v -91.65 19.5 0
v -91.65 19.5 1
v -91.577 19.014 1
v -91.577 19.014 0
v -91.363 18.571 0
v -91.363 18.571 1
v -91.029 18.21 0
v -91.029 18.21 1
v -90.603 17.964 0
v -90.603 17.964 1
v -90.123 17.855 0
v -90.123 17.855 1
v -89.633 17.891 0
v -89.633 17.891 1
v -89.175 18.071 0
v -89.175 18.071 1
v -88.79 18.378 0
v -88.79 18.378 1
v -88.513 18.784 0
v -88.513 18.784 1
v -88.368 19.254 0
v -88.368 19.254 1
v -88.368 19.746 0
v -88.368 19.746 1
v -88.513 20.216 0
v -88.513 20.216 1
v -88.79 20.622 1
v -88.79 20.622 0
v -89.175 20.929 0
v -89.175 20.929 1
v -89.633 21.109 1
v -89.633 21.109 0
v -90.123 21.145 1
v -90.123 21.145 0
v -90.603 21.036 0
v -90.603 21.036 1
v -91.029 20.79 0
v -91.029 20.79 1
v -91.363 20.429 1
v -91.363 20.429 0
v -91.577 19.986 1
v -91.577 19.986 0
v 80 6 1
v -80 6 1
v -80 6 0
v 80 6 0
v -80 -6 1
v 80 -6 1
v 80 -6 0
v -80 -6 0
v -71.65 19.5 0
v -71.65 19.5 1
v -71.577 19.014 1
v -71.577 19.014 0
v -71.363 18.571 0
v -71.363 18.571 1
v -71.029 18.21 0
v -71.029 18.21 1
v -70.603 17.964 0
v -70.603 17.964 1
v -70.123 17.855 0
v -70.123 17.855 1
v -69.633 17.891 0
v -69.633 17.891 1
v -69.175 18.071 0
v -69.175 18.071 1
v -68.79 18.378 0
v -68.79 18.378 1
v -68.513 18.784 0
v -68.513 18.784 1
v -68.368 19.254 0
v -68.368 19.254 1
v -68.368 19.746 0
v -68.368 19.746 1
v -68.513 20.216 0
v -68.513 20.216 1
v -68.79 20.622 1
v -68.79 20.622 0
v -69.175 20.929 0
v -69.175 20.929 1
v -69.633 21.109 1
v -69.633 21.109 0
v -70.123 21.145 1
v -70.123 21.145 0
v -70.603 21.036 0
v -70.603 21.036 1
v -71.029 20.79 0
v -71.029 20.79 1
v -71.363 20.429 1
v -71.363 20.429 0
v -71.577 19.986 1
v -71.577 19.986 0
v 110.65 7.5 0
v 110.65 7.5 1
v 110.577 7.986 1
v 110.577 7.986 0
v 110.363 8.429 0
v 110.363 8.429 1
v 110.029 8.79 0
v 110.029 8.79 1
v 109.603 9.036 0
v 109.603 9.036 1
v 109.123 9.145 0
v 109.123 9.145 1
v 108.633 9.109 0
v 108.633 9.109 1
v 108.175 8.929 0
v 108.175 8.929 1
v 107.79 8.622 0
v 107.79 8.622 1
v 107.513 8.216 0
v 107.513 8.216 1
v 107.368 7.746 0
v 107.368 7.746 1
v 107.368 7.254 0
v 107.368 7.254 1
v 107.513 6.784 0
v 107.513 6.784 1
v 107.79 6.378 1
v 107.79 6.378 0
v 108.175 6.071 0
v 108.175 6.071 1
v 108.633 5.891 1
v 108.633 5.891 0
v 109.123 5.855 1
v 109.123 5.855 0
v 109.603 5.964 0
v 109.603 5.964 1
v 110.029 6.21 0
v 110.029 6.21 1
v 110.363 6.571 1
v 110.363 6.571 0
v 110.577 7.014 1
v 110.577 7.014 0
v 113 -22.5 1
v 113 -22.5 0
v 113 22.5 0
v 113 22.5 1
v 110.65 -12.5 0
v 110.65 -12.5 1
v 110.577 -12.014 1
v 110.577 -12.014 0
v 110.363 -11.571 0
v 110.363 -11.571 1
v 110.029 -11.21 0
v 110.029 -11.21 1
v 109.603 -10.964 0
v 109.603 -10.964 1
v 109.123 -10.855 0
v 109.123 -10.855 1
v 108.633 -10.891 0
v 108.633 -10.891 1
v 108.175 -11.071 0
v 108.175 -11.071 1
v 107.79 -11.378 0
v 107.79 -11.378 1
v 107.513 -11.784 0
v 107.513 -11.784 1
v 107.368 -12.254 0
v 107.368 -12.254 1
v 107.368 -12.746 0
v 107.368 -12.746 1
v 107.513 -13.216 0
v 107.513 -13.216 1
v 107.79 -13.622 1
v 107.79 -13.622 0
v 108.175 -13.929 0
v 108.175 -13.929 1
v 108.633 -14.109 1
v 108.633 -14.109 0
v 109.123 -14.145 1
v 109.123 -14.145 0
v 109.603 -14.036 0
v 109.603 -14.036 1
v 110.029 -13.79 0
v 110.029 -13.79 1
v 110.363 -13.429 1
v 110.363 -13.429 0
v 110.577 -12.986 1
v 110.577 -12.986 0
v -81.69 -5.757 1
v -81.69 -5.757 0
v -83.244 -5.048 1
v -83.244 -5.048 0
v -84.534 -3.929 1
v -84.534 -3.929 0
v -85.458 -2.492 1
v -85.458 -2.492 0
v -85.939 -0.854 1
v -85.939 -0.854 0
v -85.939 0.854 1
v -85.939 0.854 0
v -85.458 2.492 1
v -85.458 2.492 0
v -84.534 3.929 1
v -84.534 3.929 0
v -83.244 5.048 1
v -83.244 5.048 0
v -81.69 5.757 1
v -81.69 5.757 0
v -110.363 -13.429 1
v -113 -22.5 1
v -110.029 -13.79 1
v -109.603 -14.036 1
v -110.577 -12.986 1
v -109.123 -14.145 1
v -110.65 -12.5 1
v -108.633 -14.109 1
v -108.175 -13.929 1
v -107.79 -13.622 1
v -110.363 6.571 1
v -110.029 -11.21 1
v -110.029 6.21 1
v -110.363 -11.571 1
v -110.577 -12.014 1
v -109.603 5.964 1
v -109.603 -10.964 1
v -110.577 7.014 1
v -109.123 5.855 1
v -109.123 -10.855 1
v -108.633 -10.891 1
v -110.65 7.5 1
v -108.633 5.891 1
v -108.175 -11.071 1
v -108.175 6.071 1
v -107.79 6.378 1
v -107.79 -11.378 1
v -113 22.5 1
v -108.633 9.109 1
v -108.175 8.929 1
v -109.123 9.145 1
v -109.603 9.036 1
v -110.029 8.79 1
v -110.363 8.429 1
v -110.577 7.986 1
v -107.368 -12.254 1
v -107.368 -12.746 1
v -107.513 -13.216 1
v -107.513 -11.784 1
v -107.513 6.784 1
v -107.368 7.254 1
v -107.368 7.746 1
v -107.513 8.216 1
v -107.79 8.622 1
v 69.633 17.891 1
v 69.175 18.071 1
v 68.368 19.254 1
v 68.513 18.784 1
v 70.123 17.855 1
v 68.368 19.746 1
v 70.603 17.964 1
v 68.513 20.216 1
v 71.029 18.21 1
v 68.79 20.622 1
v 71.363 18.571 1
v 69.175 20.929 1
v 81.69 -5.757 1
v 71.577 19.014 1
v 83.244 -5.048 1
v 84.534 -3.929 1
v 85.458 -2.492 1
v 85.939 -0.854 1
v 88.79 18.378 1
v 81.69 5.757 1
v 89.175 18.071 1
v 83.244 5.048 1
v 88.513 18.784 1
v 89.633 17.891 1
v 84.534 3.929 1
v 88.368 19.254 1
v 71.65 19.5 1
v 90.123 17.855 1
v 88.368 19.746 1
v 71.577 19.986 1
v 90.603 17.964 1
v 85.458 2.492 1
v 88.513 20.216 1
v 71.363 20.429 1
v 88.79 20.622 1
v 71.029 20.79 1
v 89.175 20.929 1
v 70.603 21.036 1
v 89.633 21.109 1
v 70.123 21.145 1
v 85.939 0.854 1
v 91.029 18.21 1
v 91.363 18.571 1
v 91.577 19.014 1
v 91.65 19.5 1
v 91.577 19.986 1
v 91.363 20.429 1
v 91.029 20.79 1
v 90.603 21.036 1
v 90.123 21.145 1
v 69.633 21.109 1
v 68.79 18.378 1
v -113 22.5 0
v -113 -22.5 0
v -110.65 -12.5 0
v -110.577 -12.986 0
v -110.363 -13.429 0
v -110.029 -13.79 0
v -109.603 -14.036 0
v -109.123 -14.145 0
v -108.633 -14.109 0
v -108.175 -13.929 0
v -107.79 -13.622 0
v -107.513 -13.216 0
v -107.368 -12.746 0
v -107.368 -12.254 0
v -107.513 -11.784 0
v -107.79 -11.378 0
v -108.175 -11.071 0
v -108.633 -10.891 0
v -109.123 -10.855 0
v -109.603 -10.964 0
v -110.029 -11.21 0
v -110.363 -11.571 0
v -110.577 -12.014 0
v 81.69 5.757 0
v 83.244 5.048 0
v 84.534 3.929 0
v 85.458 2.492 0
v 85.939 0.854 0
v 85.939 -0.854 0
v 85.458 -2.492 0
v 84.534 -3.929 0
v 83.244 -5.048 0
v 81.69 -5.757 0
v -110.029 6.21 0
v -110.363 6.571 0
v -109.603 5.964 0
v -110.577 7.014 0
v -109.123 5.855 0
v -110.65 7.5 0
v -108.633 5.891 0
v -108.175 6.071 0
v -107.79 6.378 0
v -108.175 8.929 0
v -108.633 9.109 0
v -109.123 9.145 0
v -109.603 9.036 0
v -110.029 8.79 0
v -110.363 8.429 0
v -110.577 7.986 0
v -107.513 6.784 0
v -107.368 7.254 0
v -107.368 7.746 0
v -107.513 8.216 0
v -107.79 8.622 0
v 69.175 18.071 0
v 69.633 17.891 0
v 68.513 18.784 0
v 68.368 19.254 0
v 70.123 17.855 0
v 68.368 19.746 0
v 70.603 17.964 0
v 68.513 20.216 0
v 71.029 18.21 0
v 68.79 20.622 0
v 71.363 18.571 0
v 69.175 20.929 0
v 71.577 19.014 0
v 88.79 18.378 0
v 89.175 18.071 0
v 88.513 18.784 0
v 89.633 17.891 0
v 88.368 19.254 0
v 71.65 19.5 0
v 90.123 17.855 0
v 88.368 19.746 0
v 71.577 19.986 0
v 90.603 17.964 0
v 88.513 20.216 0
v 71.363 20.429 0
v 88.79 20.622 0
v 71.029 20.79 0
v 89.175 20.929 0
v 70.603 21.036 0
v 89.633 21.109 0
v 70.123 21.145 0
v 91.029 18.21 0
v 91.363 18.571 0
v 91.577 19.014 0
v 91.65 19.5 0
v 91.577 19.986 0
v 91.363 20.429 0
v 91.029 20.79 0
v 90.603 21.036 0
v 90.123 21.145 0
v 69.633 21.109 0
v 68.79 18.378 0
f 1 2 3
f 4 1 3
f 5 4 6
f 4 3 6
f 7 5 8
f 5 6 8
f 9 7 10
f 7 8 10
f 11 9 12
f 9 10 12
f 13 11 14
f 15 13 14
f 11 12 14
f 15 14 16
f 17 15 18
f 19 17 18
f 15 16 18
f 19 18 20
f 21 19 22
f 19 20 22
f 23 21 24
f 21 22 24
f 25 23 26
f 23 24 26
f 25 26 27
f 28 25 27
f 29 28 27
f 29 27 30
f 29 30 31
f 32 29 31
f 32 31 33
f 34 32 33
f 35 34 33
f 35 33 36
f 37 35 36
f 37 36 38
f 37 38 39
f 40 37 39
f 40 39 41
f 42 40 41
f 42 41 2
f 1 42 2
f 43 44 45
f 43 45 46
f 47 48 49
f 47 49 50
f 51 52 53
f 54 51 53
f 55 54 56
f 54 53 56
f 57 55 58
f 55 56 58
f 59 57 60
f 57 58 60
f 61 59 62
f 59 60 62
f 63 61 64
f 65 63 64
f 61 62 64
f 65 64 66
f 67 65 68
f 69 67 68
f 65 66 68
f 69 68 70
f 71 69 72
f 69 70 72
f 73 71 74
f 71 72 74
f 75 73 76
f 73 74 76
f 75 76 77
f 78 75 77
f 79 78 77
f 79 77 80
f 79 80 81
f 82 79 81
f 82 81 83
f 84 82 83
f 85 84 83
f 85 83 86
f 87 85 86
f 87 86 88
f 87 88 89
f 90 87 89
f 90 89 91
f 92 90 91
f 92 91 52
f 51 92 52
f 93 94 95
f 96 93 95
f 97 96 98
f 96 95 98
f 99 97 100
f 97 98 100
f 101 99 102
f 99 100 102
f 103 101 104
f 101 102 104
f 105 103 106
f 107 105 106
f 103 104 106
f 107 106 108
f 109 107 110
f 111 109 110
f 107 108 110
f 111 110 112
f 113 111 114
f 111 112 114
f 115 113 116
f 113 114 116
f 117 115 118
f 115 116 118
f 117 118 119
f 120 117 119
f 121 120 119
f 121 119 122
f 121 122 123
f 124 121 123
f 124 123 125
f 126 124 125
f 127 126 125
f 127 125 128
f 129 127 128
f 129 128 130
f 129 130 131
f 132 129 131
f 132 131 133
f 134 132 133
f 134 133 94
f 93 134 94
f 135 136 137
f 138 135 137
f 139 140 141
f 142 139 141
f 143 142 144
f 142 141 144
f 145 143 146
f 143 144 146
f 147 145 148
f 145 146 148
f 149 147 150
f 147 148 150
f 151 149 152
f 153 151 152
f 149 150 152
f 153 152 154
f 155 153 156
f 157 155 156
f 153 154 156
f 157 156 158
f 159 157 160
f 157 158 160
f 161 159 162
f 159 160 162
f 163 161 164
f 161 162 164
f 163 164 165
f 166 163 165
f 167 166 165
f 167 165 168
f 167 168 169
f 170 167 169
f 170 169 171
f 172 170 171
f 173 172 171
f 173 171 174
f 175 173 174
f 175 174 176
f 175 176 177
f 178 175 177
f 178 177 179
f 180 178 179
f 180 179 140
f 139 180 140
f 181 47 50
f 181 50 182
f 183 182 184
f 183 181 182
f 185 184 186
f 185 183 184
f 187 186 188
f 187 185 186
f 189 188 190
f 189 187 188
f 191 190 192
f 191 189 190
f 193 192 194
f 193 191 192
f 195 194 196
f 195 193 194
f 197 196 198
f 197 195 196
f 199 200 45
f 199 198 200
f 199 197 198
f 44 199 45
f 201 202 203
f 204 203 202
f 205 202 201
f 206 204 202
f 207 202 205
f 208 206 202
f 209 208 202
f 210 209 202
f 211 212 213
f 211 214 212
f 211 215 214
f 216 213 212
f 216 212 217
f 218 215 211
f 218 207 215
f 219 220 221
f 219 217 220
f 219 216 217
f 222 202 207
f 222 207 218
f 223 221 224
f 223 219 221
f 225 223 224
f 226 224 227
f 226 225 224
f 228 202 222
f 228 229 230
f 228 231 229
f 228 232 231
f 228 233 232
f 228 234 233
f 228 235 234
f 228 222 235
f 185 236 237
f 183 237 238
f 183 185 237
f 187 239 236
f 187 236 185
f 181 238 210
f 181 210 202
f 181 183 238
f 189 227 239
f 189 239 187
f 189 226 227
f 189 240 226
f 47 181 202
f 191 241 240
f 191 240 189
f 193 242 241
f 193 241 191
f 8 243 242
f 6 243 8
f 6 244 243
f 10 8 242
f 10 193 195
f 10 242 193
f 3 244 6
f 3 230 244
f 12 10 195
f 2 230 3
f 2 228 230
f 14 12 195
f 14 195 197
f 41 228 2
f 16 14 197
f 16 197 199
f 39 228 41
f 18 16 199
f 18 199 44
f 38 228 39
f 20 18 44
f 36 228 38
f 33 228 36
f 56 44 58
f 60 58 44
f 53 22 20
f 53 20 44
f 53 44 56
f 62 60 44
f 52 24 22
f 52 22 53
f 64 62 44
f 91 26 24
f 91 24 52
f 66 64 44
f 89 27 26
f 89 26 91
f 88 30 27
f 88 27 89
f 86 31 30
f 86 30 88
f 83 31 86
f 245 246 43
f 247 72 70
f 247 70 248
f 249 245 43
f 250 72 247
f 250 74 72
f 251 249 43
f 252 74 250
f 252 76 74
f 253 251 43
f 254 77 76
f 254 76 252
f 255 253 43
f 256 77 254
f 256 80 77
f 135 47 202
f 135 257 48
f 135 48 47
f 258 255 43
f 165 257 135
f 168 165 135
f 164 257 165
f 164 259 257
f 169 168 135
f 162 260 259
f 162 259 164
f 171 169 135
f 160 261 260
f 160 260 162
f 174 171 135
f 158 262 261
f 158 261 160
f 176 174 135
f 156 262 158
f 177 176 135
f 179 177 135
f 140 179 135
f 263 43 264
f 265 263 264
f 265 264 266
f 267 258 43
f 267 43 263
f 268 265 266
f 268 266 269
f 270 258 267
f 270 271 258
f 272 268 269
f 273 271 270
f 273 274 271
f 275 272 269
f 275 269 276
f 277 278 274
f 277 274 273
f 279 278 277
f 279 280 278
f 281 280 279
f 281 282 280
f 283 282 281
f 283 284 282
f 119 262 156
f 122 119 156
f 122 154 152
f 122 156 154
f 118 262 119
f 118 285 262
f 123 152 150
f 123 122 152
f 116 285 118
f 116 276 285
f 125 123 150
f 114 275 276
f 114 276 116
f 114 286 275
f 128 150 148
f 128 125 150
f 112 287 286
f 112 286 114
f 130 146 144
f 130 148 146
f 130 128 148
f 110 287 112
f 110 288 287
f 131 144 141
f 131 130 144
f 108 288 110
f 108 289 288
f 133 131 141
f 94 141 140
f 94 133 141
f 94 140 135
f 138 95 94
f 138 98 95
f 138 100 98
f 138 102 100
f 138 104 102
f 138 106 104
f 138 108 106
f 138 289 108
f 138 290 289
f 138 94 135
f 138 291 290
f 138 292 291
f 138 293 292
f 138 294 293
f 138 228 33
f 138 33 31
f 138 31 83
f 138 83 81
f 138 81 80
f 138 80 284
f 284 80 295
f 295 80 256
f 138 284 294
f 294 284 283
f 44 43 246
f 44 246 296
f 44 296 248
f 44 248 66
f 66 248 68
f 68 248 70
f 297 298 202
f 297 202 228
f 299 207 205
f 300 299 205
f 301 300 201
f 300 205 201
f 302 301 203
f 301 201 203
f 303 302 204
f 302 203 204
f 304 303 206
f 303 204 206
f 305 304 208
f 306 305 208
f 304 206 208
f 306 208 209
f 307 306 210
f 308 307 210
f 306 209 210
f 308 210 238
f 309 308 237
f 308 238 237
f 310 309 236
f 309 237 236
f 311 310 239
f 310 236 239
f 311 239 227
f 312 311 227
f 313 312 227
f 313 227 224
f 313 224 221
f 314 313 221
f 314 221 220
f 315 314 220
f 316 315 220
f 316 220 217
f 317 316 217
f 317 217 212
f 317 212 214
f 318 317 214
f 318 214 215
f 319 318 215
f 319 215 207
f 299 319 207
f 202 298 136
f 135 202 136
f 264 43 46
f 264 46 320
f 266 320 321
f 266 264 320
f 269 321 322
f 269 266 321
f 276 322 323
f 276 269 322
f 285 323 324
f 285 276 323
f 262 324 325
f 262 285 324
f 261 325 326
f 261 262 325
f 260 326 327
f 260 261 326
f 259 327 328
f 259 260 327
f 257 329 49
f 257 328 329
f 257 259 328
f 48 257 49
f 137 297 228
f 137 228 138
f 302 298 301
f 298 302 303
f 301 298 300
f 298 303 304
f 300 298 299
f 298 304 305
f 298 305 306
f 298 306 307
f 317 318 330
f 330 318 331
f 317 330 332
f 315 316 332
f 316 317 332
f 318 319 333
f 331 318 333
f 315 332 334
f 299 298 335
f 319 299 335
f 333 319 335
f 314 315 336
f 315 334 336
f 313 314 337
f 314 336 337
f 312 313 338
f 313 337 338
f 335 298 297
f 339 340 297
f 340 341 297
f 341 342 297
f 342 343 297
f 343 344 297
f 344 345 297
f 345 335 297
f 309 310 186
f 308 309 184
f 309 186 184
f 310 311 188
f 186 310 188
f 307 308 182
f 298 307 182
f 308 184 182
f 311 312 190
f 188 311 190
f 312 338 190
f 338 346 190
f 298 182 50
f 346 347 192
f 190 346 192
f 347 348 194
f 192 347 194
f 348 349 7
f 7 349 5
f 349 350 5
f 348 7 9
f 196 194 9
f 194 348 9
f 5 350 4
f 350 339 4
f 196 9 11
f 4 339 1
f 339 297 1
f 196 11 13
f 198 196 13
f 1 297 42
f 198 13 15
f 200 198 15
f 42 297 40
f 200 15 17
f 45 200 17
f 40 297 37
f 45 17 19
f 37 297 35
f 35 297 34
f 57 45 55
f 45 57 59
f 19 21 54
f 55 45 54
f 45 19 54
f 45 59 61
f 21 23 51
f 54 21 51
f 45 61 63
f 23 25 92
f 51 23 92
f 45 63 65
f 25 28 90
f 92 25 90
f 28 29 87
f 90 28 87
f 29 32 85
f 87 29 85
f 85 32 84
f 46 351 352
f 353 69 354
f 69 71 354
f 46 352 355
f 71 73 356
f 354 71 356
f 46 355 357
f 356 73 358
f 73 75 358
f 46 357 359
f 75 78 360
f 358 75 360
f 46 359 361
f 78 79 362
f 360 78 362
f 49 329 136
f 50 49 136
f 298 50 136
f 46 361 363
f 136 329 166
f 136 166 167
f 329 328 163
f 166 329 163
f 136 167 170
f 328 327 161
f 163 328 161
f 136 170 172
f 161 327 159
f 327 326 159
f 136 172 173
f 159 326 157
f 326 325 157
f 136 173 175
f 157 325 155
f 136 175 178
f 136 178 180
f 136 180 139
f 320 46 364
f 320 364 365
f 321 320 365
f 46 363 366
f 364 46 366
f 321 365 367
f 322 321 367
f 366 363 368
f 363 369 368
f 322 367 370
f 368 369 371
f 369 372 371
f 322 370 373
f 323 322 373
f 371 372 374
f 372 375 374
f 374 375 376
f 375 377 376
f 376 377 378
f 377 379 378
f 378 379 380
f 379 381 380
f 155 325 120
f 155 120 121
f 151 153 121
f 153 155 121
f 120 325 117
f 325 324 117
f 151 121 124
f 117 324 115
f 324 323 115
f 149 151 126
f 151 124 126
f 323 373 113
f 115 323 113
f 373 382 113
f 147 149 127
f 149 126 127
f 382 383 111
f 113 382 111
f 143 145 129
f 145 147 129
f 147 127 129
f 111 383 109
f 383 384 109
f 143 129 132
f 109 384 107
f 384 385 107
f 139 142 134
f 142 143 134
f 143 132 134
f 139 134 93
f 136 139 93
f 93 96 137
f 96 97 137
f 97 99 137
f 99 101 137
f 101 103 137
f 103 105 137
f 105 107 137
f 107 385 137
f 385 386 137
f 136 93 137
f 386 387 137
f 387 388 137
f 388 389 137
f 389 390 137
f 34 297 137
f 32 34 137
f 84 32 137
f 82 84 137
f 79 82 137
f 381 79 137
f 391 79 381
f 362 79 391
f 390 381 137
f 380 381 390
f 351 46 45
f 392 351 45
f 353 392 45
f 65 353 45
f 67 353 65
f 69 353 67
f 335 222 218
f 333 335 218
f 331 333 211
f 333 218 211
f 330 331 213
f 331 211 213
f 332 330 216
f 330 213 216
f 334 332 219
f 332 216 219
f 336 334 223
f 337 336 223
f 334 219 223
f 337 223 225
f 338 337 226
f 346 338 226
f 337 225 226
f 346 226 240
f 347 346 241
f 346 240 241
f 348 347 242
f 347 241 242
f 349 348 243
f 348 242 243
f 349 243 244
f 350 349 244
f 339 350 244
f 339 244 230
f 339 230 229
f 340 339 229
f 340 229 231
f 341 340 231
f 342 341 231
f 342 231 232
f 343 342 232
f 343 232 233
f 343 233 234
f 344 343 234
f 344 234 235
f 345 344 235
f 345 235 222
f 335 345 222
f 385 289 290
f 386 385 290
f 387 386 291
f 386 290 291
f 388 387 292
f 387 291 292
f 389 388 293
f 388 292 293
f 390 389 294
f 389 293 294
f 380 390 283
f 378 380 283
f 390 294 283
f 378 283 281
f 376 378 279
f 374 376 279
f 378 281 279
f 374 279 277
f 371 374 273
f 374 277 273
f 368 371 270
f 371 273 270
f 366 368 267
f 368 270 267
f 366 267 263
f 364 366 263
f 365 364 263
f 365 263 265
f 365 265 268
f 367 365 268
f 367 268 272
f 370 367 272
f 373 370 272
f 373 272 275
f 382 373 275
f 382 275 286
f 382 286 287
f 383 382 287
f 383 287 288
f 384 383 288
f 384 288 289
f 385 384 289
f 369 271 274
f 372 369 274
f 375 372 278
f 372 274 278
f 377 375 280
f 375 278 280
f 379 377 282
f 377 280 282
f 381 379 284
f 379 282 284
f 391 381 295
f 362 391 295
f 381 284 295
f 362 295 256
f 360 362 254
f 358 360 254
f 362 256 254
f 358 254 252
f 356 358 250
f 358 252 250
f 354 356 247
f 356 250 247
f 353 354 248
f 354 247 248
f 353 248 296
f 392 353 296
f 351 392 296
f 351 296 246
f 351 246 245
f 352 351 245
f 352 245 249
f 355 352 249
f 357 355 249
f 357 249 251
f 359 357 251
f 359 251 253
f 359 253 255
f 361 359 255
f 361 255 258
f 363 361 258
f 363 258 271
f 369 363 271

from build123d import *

# Parameters (mm, degrees)
SKETCH_1_W          = 226
SKETCH_1_H          = 45
EXTRUDE_1_DEPTH     = 1
SKETCH_2_R          = 1.65
CUT_EXTRUDE_1_DEPTH = 116.222610628
CUT_EXTRUDE_2_DEPTH = 10
SKETCH_4_R          = 1.65
CUT_EXTRUDE_3_DEPTH = 116.222610628


with BuildPart() as part:
    # 草图1 → 凸台-拉伸1 (new body)
    with BuildSketch(Plane.XY):
        Rectangle(SKETCH_1_W, SKETCH_1_H)
    extrude(amount=EXTRUDE_1_DEPTH)

    # 草图2 → 切除-拉伸1 (cut, through all)
    with BuildSketch(Plane.XY.offset(1)):
        with Locations((90, 19.5)):
            Circle(SKETCH_2_R)
        with Locations((70, 19.5)):
            Circle(SKETCH_2_R)
        with Locations(Location((-70, 19.5, 0), (0, 0, 180))):
            Circle(SKETCH_2_R)
        with Locations(Location((-90, 19.5, 0), (0, 0, 180))):
            Circle(SKETCH_2_R)
    extrude(amount=-CUT_EXTRUDE_1_DEPTH, mode=Mode.SUBTRACT)

    # 草图3 → 切除-拉伸2 (cut)
    with BuildSketch(Plane.XY.offset(1)):
        with BuildLine():
            Line((-80, 6), (80, 6))
            ThreePointArc((80, 6), (86, 0), (80, -6))
            Line((80, -6), (-80, -6))
            ThreePointArc((-80, -6), (-86, 0), (-80, 6))
        make_face()
    extrude(amount=-CUT_EXTRUDE_2_DEPTH, mode=Mode.SUBTRACT)

    # 草图4 → 切除-拉伸3 (cut, through all)
    with BuildSketch(Plane.XY.offset(1)):
        with Locations((109, 7.5)):
            Circle(SKETCH_4_R)
        with Locations((109, -12.5)):
            Circle(SKETCH_4_R)
        with Locations(Location((-109, -12.5, 0), (0, 0, 180))):
            Circle(SKETCH_4_R)
        with Locations(Location((-109, 7.5, 0), (0, 0, 180))):
            Circle(SKETCH_4_R)
    extrude(amount=-CUT_EXTRUDE_3_DEPTH, mode=Mode.SUBTRACT)


solid = part.part
